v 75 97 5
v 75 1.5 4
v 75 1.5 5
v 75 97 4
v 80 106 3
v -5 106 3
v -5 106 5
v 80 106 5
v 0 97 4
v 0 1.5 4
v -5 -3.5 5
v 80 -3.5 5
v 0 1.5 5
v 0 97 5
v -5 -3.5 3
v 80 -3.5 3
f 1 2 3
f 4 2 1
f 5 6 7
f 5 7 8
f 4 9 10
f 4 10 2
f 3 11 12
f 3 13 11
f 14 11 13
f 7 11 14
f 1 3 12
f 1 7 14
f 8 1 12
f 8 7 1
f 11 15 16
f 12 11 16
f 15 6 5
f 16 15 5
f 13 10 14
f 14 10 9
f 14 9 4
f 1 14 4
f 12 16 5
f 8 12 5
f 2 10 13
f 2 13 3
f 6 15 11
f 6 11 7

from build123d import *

# Parameters (mm, degrees)
SKETCH081_W      = 75
SKETCH081_H      = 95.5
EXTRUDE073_DEPTH = 1
SKETCH071_W      = 85
SKETCH071_H      = 109.5
EXTRUDE061_DEPTH = 2


with BuildPart() as extrude073:
    # Sketch081 → Extrude073 (new body)
    with BuildSketch(Plane.XY.offset(4)):
        with Locations((37.5, 49.25)):
            Rectangle(SKETCH081_W, SKETCH081_H)
    extrude(amount=EXTRUDE073_DEPTH)


with BuildPart() as cut008:
    # Sketch071 → Extrude061 (new body)
    with BuildSketch(Plane.XY.offset(3)):
        with Locations((37.5, 51.25)):
            Rectangle(SKETCH071_W, SKETCH071_H)
    extrude(amount=EXTRUDE061_DEPTH)

    # Cut008: cut Extrude073
    add(extrude073.part, mode=Mode.SUBTRACT)


solid = cut008.part
